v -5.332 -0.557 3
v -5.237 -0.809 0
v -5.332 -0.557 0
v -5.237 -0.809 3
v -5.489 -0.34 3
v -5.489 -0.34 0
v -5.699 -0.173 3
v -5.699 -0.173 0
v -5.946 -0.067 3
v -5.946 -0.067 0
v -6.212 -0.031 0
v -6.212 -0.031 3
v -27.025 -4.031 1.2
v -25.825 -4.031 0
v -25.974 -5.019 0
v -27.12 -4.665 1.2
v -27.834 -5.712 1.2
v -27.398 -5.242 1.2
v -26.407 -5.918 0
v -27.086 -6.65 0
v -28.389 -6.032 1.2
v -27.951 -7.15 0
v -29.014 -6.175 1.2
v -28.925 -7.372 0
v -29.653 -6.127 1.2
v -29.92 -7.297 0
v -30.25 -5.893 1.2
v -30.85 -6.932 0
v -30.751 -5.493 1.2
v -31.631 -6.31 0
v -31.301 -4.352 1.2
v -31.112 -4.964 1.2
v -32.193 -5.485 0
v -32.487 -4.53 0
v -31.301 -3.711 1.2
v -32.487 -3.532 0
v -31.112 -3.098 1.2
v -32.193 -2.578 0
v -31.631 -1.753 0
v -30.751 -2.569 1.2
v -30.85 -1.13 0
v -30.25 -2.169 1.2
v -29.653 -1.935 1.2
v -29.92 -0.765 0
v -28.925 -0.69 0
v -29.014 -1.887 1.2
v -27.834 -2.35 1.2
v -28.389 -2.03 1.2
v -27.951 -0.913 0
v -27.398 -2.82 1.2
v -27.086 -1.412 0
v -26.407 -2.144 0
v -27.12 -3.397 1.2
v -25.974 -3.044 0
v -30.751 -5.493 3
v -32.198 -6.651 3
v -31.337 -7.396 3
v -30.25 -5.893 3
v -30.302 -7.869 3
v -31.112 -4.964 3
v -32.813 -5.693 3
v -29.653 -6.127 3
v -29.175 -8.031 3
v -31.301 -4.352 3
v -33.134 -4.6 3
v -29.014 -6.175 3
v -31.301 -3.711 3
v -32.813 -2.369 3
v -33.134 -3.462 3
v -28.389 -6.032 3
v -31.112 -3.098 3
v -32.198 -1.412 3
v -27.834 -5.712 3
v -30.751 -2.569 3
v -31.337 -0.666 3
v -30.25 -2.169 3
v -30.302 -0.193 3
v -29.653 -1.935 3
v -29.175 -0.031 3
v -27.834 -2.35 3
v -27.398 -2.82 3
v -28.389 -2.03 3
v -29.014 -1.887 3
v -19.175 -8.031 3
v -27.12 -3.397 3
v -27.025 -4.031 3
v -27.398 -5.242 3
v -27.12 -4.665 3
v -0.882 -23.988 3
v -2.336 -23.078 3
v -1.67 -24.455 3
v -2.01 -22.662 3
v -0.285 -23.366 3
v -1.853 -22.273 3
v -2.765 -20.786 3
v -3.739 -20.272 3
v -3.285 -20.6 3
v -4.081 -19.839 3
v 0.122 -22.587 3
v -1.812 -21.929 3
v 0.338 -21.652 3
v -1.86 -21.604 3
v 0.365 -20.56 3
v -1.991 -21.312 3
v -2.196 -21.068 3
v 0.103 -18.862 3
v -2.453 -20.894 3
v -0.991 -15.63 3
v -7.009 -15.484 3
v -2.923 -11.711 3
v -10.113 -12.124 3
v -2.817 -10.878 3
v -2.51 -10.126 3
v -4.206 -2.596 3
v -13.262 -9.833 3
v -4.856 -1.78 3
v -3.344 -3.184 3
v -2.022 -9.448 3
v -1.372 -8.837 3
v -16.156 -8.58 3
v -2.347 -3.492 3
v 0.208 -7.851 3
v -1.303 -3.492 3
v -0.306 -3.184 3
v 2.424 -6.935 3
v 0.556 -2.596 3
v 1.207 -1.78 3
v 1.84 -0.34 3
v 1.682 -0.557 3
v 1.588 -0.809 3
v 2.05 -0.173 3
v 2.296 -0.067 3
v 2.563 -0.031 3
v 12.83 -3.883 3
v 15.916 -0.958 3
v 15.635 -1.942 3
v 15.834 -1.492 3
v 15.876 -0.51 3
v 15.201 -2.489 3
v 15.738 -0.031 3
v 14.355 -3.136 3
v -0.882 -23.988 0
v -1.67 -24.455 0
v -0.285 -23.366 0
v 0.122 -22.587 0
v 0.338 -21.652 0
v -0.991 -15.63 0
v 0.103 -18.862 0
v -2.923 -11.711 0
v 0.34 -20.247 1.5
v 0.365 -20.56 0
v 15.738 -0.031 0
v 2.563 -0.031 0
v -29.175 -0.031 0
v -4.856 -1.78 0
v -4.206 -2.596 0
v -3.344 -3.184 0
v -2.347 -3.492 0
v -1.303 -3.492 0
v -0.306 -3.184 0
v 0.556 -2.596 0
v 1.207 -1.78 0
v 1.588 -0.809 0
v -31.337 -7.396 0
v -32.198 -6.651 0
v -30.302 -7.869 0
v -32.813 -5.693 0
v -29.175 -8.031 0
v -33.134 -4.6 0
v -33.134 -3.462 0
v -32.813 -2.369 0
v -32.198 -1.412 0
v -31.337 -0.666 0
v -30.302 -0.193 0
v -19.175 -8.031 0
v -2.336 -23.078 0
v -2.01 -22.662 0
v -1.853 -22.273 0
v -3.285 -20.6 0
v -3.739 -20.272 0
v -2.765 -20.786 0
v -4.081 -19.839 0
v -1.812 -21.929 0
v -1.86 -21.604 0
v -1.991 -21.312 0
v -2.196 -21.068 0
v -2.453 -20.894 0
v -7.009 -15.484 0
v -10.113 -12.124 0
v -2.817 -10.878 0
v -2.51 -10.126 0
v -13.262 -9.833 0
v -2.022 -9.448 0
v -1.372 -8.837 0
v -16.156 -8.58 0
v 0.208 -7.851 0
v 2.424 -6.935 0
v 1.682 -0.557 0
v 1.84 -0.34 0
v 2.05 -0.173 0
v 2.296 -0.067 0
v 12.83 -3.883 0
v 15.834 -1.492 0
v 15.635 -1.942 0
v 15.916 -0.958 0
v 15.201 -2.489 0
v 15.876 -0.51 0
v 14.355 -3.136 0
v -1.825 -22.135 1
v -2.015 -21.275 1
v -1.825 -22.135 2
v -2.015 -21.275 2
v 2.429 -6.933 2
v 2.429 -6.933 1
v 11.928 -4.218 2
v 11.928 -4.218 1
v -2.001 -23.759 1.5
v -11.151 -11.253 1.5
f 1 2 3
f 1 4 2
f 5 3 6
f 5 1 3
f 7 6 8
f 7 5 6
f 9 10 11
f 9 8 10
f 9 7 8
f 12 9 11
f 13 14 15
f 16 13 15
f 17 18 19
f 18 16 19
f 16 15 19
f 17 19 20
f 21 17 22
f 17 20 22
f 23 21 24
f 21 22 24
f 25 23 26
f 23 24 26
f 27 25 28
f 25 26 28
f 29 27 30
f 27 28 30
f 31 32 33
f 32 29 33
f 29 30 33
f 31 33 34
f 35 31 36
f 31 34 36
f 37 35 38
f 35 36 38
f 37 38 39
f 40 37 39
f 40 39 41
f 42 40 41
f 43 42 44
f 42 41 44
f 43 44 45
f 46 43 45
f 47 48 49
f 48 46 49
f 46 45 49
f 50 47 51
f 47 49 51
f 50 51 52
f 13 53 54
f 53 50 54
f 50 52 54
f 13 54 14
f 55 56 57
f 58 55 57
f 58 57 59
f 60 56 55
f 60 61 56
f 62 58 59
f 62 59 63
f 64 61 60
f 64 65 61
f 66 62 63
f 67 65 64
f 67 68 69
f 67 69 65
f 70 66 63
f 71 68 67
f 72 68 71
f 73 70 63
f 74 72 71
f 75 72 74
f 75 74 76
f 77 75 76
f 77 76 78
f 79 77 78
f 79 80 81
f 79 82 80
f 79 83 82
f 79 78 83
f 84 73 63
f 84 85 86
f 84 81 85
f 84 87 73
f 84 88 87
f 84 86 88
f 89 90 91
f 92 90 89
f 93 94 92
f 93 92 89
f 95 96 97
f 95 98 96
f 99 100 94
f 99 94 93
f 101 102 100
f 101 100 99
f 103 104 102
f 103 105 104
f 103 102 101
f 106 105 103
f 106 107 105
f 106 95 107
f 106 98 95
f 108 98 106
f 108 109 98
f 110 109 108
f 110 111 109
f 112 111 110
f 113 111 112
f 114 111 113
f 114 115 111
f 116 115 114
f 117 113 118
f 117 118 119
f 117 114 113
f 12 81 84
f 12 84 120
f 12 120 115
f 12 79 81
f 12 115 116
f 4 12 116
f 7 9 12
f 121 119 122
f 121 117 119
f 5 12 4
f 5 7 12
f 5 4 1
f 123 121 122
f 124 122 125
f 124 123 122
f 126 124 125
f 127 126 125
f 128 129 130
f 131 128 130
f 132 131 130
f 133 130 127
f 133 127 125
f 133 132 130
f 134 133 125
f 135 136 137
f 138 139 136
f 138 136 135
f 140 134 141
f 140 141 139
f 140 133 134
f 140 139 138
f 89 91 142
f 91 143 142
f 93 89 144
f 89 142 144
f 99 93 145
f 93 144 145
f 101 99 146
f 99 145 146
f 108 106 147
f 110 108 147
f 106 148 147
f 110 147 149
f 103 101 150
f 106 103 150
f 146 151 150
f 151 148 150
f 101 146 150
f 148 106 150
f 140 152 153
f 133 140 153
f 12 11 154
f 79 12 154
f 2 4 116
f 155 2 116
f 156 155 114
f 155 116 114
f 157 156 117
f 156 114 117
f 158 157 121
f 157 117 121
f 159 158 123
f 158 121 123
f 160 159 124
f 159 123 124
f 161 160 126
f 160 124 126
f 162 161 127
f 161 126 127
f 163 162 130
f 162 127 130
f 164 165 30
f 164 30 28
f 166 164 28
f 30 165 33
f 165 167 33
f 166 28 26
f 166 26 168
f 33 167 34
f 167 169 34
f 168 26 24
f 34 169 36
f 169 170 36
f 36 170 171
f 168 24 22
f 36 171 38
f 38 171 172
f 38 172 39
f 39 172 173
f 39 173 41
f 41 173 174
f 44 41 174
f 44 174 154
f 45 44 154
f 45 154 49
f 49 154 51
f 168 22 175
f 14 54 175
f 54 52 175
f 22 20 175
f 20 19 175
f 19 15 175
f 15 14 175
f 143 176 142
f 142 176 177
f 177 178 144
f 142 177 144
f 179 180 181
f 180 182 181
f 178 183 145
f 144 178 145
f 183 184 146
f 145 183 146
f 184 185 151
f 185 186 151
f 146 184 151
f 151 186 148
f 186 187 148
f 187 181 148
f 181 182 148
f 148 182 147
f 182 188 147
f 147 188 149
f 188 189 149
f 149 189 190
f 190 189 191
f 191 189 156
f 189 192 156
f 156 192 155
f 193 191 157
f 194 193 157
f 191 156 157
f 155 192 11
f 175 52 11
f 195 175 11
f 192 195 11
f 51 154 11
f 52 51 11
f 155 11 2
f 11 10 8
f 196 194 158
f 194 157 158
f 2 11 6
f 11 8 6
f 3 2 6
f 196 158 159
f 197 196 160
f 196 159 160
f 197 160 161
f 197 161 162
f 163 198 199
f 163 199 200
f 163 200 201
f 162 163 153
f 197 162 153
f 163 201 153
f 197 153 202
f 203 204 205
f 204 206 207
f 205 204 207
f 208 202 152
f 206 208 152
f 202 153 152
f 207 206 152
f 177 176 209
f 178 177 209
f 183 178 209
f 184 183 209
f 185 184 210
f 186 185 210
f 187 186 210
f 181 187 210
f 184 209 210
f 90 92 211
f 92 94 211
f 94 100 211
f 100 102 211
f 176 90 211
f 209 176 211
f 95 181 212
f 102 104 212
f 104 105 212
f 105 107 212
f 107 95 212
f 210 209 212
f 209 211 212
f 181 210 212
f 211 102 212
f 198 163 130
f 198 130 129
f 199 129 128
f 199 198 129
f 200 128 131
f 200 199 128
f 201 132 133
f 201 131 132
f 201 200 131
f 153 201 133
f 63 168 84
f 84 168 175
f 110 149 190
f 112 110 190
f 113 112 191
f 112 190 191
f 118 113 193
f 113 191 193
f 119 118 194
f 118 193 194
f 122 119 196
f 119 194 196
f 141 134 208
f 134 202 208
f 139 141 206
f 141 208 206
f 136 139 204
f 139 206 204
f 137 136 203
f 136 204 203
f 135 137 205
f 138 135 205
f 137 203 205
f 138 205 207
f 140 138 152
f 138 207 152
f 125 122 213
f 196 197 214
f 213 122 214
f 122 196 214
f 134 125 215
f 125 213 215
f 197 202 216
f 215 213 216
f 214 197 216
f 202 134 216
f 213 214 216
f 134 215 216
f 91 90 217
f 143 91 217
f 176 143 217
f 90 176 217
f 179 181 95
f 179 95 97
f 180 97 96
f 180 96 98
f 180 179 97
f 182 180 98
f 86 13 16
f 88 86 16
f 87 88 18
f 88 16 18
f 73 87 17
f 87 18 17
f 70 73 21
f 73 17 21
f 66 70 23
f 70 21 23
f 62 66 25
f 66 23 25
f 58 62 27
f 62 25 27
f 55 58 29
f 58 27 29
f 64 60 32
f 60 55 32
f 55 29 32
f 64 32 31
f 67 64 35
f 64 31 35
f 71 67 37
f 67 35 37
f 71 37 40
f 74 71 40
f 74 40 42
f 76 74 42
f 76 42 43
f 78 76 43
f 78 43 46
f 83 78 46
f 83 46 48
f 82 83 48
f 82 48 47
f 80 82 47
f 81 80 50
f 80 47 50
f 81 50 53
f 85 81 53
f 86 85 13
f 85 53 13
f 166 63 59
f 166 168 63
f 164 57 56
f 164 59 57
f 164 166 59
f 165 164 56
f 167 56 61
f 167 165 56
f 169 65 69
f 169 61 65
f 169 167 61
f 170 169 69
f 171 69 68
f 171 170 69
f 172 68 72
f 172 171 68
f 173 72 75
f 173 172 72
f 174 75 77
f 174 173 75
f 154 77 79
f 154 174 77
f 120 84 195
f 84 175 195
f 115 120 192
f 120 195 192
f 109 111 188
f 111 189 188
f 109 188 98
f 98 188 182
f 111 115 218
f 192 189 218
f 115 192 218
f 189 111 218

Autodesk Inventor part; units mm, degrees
ref_plane "YZ Plane" through (0, 0, 0) normal (1, 0, 0) x (0, 1, 0)
ref_plane "XZ Plane" through (0, 0, 0) normal (0, 1, 0) x (-1, 0, 0)
ref_plane "XY Plane" through (0, 0, 0) normal (0, 0, 1) x (1, 0, 0)
sketch "Sketch1" plane through (0, 0, 0) normal (0, 0, 1) x (1, 0, 0)
  line L0 (15.7385, -0.0311) -> (-29.1749, -0.0311)
  line L1 (-29.1749, -0.0311) -> (2.0558, -0.0311) construction
  line L2 (-29.1749, -8.0311) -> (-19.1749, -8.0311)
  line L3 (-19.1749, -8.0311) -> (-9.0765, -8.6728) construction
  line L4 (-9.0765, -8.6728) -> (-1.6699, -24.4547) construction
  spline S0 degree 2 poles (-19.1749, -8.0311) (-9.0765, -8.6728) (-1.6699, -24.4547) knots 1 1 1 2 2 2
  line L5 (-1.6699, -24.4547) -> (2.9761, -22.4111) construction
  line L6 (2.9761, -22.4111) -> (-2.9231, -11.7108) construction
  spline S1 degree 2 poles (-1.6699, -24.4547) (2.9761, -22.4111) (-2.9231, -11.7108) knots 1 1 1 2 2 2
  line L7 (-2.9231, -11.7108) -> (-2.9231, -4.7242) construction
  line L8 (-2.9231, -4.7242) -> (18.0519, -6.1311) construction
  line L9 (18.0519, -6.1311) -> (15.7385, -0.0311) construction
  spline S2 degree 3 poles (-2.9231, -11.7108) (-2.9231, -4.7242) (18.0519, -6.1311) (15.7385, -0.0311) knots 1 1 1 1 2 2 2 2
  arc A0 (-29.1749, -0.0311) -> (-29.1749, -8.0311) centre (-29.1749, -4.0311) ccw
  circle A1 centre (-29.1749, -4.0311) radius 2.15
  point P0 (0, 0)
  dimension "d0" = 8
  dimension "d1" = 10
  dimension "d2" = 4.3
extrude "Extrusion1" add sketch "Sketch1" along normal blind 3
sketch "Sketch2" plane through (0, 0, 3) normal (0, 0, 1) x (1, 0, 0)
  line L0 (15.7385, -0.0311) -> (-29.1749, -0.0311) projected
  line L1 (-29.1749, -0.0311) -> (-1.8249, -0.0311)
  circle A0 centre (-1.8249, -0.0311) radius 3.5
  point P0 (0, 0)
  dimension "d5" = 27.35
  dimension "d6" = 7
extrude "Extrusion2" cut sketch "Sketch2" against normal blind 3
sketch "Sketch3" plane through (0, 0, 3) normal (0, 0, 1) x (1, 0, 0)
  line L0 (-1.6699, -24.4547) -> (-2.4199, -23.1557)
  line L1 (-1.6699, -24.4547) -> (-0.1699, -24.4547) construction
  line L2 (-3.7341, -20.8795) -> (-2.4199, -23.1557)
  line L3 (-2.4199, -23.1557) -> (-1.13, -22.0176) construction
  line L4 (-1.13, -22.0176) -> (-2.0449, -20.2761) construction
  line L5 (-2.0449, -20.2761) -> (-3.7341, -20.8795) construction
  spline S0 degree 3 poles (-2.4199, -23.1557) (-1.13, -22.0176) (-2.0449, -20.2761) (-3.7341, -20.8795) knots 1 1 1 1 2 2 2 2
  point P0 (0, 0)
  dimension "d9" = 1.5
  dimension "d10" = 120
extrude "Extrusion3" cut sketch "Sketch3" against normal blind 3
fillet "Fillet2" radius 2 1 edges at (-3.5248, -20.8155, 1.5)
chamfer "Chamfer1" distance 1.2 angle 45 1 edges at (-31.3249, -4.0311, 0)
fillet "Fillet4" radius 1 2 edges at (1.6751, -0.0311, 1.5) (-5.3249, -0.0311, 1.5)
properties part number "retreat"
